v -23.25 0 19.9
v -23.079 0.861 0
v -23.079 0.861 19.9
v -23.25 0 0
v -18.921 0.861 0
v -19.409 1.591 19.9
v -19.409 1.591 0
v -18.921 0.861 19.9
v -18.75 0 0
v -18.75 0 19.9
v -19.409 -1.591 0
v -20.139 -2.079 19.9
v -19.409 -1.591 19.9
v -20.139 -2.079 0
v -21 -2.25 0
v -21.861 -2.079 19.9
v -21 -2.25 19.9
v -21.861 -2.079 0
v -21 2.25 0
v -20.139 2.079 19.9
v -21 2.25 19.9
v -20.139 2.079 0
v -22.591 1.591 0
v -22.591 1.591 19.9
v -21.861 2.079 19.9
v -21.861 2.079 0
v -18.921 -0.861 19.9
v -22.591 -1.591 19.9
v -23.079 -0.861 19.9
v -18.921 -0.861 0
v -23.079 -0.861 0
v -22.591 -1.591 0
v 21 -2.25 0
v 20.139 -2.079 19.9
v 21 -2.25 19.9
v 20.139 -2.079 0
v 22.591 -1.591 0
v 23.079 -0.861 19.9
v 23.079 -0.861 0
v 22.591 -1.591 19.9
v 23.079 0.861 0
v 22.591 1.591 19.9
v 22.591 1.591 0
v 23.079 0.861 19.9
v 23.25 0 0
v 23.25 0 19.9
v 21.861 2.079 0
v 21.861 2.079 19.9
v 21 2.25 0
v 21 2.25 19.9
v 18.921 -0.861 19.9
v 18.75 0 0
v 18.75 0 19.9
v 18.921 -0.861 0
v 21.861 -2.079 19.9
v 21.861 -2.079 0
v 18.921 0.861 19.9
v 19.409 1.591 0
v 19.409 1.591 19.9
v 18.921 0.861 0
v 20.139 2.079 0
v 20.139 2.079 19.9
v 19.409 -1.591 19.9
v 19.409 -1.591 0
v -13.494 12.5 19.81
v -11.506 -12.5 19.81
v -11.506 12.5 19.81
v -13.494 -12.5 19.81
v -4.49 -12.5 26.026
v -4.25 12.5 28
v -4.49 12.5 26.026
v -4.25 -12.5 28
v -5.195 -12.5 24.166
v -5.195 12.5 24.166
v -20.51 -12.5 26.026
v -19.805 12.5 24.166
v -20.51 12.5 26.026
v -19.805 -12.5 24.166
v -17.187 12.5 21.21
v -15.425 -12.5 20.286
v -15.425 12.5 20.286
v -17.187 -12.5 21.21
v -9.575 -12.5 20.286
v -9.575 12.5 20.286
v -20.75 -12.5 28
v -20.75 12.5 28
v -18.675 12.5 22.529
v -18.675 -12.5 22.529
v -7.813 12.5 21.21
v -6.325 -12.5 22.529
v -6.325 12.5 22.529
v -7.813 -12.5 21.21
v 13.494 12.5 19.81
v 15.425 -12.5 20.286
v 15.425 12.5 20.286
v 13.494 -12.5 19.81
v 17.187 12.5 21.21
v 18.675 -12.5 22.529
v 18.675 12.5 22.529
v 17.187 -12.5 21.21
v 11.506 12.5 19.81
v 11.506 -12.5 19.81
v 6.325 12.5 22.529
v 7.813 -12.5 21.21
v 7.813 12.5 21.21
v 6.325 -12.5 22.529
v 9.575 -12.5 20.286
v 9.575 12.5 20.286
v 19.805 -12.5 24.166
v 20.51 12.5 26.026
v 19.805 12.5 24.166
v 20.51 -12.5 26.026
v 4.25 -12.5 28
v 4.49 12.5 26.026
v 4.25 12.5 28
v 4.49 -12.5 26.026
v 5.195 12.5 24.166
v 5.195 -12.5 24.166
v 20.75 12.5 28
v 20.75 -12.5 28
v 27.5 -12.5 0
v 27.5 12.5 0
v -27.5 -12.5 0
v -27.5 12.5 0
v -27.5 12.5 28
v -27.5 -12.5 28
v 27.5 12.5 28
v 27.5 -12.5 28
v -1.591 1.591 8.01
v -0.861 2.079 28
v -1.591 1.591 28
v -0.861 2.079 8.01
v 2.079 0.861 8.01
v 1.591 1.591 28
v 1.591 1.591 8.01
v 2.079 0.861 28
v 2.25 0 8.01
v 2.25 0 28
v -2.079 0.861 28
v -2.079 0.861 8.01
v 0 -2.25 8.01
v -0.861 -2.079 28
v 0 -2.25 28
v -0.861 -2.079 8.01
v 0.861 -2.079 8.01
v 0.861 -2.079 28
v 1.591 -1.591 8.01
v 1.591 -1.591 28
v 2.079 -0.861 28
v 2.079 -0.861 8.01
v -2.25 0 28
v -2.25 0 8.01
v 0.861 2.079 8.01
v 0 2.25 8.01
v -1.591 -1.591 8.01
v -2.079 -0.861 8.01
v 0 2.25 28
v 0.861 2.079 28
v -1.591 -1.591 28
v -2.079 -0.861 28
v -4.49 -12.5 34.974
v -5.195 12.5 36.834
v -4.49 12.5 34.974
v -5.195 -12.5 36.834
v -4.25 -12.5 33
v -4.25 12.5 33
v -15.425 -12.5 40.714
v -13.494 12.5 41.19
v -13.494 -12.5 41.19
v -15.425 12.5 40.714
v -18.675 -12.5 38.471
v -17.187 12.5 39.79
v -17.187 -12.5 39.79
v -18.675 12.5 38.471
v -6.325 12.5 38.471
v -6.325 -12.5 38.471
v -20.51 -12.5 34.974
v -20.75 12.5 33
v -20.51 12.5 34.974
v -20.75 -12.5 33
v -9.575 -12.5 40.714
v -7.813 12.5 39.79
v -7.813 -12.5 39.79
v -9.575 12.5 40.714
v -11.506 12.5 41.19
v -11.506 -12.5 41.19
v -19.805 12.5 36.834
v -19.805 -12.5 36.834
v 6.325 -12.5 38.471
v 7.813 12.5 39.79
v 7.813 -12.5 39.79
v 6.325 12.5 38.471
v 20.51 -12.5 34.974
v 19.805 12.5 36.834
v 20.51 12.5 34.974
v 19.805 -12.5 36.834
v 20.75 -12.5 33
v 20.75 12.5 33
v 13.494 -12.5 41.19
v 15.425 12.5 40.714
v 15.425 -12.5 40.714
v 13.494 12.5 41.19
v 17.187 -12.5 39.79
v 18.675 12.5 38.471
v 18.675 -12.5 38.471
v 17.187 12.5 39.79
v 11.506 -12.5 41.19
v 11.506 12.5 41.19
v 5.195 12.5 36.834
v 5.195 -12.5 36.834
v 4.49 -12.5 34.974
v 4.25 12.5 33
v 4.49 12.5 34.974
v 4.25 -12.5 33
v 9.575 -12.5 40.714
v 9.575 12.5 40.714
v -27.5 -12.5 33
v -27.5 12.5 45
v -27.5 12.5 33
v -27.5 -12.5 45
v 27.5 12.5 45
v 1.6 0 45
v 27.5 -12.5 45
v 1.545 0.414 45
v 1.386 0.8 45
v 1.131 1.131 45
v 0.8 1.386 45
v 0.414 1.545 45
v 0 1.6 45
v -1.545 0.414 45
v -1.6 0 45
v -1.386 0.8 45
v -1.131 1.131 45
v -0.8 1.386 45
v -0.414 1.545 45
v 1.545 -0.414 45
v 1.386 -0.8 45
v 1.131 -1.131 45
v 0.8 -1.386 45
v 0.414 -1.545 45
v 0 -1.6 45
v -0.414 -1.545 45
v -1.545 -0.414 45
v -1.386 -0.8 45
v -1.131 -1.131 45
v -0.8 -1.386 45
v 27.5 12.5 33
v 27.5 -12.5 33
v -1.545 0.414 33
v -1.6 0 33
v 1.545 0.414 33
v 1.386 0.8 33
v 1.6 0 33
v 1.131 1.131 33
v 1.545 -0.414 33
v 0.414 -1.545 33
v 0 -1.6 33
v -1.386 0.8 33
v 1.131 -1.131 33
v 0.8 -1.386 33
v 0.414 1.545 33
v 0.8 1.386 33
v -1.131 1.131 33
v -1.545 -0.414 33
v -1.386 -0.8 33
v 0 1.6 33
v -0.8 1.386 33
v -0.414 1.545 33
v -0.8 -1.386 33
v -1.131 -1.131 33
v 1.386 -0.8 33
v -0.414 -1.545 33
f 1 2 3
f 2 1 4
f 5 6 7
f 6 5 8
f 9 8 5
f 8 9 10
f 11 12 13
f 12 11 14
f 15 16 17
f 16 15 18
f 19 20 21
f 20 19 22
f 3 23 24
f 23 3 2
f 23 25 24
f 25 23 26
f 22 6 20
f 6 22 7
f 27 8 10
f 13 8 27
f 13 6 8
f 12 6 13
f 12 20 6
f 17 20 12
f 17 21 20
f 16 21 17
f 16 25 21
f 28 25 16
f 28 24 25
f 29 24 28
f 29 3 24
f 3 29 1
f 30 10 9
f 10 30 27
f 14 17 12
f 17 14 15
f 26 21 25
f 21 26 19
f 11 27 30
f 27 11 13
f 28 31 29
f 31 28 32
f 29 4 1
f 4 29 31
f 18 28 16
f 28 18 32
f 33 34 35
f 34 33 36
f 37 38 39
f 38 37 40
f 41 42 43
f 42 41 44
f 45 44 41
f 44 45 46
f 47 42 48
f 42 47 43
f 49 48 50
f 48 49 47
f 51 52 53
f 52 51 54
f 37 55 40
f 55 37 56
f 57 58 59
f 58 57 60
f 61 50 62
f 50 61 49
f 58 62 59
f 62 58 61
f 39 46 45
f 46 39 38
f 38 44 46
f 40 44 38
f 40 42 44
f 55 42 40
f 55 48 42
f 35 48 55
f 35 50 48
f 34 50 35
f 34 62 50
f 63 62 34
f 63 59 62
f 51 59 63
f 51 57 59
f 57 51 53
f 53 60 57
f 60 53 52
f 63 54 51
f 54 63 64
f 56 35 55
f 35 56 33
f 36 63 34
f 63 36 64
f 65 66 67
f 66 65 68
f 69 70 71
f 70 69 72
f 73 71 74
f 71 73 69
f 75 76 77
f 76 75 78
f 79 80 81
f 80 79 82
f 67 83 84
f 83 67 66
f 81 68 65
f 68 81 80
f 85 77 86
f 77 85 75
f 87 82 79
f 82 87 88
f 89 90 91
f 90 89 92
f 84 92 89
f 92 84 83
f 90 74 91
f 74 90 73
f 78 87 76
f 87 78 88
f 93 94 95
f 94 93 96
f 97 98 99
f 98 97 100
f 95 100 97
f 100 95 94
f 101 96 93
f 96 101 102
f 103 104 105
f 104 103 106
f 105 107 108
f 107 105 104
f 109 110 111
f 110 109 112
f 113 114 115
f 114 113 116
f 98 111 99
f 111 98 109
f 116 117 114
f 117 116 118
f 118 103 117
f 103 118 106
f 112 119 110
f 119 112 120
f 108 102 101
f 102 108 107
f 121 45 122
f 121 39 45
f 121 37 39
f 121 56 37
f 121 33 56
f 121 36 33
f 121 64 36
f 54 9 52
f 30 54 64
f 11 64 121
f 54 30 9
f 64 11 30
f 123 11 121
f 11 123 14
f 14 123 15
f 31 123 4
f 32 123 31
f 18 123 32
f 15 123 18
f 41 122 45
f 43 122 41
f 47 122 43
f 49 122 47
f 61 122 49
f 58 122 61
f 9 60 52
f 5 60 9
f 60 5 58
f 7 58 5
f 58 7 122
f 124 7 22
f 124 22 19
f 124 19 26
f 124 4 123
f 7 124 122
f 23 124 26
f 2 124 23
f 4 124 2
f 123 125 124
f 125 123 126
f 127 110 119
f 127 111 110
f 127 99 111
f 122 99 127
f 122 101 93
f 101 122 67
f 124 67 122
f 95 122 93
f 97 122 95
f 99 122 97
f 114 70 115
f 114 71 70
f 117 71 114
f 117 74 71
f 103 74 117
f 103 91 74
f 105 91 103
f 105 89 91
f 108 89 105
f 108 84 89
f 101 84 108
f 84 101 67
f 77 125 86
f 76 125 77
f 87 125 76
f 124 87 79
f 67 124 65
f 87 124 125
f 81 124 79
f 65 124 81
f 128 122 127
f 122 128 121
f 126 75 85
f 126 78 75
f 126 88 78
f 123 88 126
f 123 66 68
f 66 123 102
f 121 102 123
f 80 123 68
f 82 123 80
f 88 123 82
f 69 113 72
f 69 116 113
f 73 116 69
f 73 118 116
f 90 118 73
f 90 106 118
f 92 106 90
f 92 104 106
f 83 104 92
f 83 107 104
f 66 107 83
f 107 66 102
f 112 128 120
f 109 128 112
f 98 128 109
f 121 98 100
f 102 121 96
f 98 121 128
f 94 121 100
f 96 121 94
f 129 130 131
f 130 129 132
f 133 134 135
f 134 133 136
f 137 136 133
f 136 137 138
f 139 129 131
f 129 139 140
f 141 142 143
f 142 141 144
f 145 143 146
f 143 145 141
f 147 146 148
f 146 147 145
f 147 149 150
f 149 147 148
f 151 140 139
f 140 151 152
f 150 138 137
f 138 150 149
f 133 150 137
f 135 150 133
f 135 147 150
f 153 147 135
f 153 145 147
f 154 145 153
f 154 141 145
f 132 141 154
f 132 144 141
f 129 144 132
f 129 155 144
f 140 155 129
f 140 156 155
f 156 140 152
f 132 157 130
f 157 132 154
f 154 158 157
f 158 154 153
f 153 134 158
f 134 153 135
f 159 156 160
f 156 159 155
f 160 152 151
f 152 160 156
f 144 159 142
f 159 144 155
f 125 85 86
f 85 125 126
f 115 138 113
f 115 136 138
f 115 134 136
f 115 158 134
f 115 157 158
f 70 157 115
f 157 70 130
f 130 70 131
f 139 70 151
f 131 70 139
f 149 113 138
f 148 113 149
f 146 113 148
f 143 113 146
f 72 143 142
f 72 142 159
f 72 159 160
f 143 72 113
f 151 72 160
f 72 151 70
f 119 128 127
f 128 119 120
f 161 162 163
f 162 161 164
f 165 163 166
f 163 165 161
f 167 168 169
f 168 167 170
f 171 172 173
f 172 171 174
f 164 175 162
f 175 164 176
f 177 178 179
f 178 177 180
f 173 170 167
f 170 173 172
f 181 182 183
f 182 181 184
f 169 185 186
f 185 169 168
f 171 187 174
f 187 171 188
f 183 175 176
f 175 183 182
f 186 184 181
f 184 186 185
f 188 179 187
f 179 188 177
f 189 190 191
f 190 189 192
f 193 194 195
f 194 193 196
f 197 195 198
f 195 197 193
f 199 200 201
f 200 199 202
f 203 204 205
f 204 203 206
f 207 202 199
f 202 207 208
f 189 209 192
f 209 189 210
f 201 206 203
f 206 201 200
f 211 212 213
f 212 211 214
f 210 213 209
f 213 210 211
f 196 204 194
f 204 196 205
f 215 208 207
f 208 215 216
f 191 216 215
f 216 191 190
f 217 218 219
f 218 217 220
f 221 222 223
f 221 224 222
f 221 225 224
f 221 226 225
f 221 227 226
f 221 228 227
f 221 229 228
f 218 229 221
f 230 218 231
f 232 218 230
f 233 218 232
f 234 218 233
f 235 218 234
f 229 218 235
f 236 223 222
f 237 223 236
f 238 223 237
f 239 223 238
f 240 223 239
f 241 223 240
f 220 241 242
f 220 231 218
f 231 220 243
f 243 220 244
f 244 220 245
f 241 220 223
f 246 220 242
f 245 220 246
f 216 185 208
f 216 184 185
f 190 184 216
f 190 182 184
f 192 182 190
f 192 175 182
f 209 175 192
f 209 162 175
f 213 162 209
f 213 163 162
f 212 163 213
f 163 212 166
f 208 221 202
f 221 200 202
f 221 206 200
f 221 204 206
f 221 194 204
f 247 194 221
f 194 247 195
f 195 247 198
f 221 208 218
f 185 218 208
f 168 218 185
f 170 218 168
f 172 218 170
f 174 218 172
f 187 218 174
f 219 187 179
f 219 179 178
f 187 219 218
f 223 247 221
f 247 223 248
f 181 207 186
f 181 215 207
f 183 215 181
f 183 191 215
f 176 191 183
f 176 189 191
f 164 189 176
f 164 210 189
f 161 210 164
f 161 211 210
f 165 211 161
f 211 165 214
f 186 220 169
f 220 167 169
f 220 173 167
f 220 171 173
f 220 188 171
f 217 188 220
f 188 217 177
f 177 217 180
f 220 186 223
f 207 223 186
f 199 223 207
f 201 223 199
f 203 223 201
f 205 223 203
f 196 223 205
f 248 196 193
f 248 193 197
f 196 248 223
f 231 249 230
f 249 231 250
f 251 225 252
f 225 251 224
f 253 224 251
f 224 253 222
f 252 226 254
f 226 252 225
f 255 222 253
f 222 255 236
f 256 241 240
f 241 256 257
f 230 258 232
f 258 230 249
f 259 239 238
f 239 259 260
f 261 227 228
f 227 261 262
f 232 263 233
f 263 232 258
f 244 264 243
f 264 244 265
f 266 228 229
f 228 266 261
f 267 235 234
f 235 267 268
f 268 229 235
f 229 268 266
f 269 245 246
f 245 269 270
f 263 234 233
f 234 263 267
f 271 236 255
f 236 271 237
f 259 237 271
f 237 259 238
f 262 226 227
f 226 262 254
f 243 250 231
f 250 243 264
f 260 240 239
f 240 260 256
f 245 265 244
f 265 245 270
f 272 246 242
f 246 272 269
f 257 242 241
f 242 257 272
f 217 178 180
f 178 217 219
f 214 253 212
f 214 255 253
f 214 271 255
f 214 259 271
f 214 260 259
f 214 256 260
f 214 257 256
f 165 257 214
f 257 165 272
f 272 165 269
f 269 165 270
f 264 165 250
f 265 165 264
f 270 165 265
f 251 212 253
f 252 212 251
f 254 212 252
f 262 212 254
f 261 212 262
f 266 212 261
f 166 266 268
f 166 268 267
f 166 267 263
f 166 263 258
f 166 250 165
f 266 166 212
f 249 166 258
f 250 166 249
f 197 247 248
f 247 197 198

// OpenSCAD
width = 55;
height = 40;
thickness = 25;
pipe_height = 28;

module PlaceAtCentres(cx) {
  dx = cx / 2;
  for (x = [-dx, dx]) {
    translate([x, 0]) {
      children();
    }
  }
}

module Full() {
  difference() {
    // Body
    linear_extrude(height) {
      square([width, thickness], center = true);
    }

    // Case mounting holes (for M3 brass insert)
    translate([0, 0, -0.1]) {
      PlaceAtCentres(cx = 42) {
        cylinder(d = 4.5, h = 20, $fn = 16);
      }
    }

    // Pipe cutouts
    translate([0, 0, pipe_height]) {
      PlaceAtCentres(cx = 25) {
        rotate([90, 0, 0]) {
            cylinder(d = 16.5, h = thickness + 2, center = true);
        }
      }
    }
  }
}

module Base() {
  color("blue") {
    intersection() {
      difference() {
        Full();

        // Clamp mounting hole (for M3 brass insert)
        translate([0, 0, pipe_height - 20 + 0.01]) {
          cylinder(d = 4.5, h = 20, $fn = 16);
        }
      }

      translate([-width / 2, -thickness / 2, 0]) {
        cube([width, thickness, pipe_height]);
      }
    }
  }
}

module Clamp() {
  color("green") {
    intersection() {
      difference() {
        Full();

        // Mounting clearance hole
        translate([0, 0, pipe_height - 0.1]) {
          cylinder(d = 3.2, h = pipe_height + 0.2, $fn = 24);
        }
      }

      translate([-width / 2, -thickness / 2, pipe_height]) {
        cube([width, thickness, height - pipe_height]);
      }
    }
  }
}

Base();
translate([0, 0, 5]) Clamp();
